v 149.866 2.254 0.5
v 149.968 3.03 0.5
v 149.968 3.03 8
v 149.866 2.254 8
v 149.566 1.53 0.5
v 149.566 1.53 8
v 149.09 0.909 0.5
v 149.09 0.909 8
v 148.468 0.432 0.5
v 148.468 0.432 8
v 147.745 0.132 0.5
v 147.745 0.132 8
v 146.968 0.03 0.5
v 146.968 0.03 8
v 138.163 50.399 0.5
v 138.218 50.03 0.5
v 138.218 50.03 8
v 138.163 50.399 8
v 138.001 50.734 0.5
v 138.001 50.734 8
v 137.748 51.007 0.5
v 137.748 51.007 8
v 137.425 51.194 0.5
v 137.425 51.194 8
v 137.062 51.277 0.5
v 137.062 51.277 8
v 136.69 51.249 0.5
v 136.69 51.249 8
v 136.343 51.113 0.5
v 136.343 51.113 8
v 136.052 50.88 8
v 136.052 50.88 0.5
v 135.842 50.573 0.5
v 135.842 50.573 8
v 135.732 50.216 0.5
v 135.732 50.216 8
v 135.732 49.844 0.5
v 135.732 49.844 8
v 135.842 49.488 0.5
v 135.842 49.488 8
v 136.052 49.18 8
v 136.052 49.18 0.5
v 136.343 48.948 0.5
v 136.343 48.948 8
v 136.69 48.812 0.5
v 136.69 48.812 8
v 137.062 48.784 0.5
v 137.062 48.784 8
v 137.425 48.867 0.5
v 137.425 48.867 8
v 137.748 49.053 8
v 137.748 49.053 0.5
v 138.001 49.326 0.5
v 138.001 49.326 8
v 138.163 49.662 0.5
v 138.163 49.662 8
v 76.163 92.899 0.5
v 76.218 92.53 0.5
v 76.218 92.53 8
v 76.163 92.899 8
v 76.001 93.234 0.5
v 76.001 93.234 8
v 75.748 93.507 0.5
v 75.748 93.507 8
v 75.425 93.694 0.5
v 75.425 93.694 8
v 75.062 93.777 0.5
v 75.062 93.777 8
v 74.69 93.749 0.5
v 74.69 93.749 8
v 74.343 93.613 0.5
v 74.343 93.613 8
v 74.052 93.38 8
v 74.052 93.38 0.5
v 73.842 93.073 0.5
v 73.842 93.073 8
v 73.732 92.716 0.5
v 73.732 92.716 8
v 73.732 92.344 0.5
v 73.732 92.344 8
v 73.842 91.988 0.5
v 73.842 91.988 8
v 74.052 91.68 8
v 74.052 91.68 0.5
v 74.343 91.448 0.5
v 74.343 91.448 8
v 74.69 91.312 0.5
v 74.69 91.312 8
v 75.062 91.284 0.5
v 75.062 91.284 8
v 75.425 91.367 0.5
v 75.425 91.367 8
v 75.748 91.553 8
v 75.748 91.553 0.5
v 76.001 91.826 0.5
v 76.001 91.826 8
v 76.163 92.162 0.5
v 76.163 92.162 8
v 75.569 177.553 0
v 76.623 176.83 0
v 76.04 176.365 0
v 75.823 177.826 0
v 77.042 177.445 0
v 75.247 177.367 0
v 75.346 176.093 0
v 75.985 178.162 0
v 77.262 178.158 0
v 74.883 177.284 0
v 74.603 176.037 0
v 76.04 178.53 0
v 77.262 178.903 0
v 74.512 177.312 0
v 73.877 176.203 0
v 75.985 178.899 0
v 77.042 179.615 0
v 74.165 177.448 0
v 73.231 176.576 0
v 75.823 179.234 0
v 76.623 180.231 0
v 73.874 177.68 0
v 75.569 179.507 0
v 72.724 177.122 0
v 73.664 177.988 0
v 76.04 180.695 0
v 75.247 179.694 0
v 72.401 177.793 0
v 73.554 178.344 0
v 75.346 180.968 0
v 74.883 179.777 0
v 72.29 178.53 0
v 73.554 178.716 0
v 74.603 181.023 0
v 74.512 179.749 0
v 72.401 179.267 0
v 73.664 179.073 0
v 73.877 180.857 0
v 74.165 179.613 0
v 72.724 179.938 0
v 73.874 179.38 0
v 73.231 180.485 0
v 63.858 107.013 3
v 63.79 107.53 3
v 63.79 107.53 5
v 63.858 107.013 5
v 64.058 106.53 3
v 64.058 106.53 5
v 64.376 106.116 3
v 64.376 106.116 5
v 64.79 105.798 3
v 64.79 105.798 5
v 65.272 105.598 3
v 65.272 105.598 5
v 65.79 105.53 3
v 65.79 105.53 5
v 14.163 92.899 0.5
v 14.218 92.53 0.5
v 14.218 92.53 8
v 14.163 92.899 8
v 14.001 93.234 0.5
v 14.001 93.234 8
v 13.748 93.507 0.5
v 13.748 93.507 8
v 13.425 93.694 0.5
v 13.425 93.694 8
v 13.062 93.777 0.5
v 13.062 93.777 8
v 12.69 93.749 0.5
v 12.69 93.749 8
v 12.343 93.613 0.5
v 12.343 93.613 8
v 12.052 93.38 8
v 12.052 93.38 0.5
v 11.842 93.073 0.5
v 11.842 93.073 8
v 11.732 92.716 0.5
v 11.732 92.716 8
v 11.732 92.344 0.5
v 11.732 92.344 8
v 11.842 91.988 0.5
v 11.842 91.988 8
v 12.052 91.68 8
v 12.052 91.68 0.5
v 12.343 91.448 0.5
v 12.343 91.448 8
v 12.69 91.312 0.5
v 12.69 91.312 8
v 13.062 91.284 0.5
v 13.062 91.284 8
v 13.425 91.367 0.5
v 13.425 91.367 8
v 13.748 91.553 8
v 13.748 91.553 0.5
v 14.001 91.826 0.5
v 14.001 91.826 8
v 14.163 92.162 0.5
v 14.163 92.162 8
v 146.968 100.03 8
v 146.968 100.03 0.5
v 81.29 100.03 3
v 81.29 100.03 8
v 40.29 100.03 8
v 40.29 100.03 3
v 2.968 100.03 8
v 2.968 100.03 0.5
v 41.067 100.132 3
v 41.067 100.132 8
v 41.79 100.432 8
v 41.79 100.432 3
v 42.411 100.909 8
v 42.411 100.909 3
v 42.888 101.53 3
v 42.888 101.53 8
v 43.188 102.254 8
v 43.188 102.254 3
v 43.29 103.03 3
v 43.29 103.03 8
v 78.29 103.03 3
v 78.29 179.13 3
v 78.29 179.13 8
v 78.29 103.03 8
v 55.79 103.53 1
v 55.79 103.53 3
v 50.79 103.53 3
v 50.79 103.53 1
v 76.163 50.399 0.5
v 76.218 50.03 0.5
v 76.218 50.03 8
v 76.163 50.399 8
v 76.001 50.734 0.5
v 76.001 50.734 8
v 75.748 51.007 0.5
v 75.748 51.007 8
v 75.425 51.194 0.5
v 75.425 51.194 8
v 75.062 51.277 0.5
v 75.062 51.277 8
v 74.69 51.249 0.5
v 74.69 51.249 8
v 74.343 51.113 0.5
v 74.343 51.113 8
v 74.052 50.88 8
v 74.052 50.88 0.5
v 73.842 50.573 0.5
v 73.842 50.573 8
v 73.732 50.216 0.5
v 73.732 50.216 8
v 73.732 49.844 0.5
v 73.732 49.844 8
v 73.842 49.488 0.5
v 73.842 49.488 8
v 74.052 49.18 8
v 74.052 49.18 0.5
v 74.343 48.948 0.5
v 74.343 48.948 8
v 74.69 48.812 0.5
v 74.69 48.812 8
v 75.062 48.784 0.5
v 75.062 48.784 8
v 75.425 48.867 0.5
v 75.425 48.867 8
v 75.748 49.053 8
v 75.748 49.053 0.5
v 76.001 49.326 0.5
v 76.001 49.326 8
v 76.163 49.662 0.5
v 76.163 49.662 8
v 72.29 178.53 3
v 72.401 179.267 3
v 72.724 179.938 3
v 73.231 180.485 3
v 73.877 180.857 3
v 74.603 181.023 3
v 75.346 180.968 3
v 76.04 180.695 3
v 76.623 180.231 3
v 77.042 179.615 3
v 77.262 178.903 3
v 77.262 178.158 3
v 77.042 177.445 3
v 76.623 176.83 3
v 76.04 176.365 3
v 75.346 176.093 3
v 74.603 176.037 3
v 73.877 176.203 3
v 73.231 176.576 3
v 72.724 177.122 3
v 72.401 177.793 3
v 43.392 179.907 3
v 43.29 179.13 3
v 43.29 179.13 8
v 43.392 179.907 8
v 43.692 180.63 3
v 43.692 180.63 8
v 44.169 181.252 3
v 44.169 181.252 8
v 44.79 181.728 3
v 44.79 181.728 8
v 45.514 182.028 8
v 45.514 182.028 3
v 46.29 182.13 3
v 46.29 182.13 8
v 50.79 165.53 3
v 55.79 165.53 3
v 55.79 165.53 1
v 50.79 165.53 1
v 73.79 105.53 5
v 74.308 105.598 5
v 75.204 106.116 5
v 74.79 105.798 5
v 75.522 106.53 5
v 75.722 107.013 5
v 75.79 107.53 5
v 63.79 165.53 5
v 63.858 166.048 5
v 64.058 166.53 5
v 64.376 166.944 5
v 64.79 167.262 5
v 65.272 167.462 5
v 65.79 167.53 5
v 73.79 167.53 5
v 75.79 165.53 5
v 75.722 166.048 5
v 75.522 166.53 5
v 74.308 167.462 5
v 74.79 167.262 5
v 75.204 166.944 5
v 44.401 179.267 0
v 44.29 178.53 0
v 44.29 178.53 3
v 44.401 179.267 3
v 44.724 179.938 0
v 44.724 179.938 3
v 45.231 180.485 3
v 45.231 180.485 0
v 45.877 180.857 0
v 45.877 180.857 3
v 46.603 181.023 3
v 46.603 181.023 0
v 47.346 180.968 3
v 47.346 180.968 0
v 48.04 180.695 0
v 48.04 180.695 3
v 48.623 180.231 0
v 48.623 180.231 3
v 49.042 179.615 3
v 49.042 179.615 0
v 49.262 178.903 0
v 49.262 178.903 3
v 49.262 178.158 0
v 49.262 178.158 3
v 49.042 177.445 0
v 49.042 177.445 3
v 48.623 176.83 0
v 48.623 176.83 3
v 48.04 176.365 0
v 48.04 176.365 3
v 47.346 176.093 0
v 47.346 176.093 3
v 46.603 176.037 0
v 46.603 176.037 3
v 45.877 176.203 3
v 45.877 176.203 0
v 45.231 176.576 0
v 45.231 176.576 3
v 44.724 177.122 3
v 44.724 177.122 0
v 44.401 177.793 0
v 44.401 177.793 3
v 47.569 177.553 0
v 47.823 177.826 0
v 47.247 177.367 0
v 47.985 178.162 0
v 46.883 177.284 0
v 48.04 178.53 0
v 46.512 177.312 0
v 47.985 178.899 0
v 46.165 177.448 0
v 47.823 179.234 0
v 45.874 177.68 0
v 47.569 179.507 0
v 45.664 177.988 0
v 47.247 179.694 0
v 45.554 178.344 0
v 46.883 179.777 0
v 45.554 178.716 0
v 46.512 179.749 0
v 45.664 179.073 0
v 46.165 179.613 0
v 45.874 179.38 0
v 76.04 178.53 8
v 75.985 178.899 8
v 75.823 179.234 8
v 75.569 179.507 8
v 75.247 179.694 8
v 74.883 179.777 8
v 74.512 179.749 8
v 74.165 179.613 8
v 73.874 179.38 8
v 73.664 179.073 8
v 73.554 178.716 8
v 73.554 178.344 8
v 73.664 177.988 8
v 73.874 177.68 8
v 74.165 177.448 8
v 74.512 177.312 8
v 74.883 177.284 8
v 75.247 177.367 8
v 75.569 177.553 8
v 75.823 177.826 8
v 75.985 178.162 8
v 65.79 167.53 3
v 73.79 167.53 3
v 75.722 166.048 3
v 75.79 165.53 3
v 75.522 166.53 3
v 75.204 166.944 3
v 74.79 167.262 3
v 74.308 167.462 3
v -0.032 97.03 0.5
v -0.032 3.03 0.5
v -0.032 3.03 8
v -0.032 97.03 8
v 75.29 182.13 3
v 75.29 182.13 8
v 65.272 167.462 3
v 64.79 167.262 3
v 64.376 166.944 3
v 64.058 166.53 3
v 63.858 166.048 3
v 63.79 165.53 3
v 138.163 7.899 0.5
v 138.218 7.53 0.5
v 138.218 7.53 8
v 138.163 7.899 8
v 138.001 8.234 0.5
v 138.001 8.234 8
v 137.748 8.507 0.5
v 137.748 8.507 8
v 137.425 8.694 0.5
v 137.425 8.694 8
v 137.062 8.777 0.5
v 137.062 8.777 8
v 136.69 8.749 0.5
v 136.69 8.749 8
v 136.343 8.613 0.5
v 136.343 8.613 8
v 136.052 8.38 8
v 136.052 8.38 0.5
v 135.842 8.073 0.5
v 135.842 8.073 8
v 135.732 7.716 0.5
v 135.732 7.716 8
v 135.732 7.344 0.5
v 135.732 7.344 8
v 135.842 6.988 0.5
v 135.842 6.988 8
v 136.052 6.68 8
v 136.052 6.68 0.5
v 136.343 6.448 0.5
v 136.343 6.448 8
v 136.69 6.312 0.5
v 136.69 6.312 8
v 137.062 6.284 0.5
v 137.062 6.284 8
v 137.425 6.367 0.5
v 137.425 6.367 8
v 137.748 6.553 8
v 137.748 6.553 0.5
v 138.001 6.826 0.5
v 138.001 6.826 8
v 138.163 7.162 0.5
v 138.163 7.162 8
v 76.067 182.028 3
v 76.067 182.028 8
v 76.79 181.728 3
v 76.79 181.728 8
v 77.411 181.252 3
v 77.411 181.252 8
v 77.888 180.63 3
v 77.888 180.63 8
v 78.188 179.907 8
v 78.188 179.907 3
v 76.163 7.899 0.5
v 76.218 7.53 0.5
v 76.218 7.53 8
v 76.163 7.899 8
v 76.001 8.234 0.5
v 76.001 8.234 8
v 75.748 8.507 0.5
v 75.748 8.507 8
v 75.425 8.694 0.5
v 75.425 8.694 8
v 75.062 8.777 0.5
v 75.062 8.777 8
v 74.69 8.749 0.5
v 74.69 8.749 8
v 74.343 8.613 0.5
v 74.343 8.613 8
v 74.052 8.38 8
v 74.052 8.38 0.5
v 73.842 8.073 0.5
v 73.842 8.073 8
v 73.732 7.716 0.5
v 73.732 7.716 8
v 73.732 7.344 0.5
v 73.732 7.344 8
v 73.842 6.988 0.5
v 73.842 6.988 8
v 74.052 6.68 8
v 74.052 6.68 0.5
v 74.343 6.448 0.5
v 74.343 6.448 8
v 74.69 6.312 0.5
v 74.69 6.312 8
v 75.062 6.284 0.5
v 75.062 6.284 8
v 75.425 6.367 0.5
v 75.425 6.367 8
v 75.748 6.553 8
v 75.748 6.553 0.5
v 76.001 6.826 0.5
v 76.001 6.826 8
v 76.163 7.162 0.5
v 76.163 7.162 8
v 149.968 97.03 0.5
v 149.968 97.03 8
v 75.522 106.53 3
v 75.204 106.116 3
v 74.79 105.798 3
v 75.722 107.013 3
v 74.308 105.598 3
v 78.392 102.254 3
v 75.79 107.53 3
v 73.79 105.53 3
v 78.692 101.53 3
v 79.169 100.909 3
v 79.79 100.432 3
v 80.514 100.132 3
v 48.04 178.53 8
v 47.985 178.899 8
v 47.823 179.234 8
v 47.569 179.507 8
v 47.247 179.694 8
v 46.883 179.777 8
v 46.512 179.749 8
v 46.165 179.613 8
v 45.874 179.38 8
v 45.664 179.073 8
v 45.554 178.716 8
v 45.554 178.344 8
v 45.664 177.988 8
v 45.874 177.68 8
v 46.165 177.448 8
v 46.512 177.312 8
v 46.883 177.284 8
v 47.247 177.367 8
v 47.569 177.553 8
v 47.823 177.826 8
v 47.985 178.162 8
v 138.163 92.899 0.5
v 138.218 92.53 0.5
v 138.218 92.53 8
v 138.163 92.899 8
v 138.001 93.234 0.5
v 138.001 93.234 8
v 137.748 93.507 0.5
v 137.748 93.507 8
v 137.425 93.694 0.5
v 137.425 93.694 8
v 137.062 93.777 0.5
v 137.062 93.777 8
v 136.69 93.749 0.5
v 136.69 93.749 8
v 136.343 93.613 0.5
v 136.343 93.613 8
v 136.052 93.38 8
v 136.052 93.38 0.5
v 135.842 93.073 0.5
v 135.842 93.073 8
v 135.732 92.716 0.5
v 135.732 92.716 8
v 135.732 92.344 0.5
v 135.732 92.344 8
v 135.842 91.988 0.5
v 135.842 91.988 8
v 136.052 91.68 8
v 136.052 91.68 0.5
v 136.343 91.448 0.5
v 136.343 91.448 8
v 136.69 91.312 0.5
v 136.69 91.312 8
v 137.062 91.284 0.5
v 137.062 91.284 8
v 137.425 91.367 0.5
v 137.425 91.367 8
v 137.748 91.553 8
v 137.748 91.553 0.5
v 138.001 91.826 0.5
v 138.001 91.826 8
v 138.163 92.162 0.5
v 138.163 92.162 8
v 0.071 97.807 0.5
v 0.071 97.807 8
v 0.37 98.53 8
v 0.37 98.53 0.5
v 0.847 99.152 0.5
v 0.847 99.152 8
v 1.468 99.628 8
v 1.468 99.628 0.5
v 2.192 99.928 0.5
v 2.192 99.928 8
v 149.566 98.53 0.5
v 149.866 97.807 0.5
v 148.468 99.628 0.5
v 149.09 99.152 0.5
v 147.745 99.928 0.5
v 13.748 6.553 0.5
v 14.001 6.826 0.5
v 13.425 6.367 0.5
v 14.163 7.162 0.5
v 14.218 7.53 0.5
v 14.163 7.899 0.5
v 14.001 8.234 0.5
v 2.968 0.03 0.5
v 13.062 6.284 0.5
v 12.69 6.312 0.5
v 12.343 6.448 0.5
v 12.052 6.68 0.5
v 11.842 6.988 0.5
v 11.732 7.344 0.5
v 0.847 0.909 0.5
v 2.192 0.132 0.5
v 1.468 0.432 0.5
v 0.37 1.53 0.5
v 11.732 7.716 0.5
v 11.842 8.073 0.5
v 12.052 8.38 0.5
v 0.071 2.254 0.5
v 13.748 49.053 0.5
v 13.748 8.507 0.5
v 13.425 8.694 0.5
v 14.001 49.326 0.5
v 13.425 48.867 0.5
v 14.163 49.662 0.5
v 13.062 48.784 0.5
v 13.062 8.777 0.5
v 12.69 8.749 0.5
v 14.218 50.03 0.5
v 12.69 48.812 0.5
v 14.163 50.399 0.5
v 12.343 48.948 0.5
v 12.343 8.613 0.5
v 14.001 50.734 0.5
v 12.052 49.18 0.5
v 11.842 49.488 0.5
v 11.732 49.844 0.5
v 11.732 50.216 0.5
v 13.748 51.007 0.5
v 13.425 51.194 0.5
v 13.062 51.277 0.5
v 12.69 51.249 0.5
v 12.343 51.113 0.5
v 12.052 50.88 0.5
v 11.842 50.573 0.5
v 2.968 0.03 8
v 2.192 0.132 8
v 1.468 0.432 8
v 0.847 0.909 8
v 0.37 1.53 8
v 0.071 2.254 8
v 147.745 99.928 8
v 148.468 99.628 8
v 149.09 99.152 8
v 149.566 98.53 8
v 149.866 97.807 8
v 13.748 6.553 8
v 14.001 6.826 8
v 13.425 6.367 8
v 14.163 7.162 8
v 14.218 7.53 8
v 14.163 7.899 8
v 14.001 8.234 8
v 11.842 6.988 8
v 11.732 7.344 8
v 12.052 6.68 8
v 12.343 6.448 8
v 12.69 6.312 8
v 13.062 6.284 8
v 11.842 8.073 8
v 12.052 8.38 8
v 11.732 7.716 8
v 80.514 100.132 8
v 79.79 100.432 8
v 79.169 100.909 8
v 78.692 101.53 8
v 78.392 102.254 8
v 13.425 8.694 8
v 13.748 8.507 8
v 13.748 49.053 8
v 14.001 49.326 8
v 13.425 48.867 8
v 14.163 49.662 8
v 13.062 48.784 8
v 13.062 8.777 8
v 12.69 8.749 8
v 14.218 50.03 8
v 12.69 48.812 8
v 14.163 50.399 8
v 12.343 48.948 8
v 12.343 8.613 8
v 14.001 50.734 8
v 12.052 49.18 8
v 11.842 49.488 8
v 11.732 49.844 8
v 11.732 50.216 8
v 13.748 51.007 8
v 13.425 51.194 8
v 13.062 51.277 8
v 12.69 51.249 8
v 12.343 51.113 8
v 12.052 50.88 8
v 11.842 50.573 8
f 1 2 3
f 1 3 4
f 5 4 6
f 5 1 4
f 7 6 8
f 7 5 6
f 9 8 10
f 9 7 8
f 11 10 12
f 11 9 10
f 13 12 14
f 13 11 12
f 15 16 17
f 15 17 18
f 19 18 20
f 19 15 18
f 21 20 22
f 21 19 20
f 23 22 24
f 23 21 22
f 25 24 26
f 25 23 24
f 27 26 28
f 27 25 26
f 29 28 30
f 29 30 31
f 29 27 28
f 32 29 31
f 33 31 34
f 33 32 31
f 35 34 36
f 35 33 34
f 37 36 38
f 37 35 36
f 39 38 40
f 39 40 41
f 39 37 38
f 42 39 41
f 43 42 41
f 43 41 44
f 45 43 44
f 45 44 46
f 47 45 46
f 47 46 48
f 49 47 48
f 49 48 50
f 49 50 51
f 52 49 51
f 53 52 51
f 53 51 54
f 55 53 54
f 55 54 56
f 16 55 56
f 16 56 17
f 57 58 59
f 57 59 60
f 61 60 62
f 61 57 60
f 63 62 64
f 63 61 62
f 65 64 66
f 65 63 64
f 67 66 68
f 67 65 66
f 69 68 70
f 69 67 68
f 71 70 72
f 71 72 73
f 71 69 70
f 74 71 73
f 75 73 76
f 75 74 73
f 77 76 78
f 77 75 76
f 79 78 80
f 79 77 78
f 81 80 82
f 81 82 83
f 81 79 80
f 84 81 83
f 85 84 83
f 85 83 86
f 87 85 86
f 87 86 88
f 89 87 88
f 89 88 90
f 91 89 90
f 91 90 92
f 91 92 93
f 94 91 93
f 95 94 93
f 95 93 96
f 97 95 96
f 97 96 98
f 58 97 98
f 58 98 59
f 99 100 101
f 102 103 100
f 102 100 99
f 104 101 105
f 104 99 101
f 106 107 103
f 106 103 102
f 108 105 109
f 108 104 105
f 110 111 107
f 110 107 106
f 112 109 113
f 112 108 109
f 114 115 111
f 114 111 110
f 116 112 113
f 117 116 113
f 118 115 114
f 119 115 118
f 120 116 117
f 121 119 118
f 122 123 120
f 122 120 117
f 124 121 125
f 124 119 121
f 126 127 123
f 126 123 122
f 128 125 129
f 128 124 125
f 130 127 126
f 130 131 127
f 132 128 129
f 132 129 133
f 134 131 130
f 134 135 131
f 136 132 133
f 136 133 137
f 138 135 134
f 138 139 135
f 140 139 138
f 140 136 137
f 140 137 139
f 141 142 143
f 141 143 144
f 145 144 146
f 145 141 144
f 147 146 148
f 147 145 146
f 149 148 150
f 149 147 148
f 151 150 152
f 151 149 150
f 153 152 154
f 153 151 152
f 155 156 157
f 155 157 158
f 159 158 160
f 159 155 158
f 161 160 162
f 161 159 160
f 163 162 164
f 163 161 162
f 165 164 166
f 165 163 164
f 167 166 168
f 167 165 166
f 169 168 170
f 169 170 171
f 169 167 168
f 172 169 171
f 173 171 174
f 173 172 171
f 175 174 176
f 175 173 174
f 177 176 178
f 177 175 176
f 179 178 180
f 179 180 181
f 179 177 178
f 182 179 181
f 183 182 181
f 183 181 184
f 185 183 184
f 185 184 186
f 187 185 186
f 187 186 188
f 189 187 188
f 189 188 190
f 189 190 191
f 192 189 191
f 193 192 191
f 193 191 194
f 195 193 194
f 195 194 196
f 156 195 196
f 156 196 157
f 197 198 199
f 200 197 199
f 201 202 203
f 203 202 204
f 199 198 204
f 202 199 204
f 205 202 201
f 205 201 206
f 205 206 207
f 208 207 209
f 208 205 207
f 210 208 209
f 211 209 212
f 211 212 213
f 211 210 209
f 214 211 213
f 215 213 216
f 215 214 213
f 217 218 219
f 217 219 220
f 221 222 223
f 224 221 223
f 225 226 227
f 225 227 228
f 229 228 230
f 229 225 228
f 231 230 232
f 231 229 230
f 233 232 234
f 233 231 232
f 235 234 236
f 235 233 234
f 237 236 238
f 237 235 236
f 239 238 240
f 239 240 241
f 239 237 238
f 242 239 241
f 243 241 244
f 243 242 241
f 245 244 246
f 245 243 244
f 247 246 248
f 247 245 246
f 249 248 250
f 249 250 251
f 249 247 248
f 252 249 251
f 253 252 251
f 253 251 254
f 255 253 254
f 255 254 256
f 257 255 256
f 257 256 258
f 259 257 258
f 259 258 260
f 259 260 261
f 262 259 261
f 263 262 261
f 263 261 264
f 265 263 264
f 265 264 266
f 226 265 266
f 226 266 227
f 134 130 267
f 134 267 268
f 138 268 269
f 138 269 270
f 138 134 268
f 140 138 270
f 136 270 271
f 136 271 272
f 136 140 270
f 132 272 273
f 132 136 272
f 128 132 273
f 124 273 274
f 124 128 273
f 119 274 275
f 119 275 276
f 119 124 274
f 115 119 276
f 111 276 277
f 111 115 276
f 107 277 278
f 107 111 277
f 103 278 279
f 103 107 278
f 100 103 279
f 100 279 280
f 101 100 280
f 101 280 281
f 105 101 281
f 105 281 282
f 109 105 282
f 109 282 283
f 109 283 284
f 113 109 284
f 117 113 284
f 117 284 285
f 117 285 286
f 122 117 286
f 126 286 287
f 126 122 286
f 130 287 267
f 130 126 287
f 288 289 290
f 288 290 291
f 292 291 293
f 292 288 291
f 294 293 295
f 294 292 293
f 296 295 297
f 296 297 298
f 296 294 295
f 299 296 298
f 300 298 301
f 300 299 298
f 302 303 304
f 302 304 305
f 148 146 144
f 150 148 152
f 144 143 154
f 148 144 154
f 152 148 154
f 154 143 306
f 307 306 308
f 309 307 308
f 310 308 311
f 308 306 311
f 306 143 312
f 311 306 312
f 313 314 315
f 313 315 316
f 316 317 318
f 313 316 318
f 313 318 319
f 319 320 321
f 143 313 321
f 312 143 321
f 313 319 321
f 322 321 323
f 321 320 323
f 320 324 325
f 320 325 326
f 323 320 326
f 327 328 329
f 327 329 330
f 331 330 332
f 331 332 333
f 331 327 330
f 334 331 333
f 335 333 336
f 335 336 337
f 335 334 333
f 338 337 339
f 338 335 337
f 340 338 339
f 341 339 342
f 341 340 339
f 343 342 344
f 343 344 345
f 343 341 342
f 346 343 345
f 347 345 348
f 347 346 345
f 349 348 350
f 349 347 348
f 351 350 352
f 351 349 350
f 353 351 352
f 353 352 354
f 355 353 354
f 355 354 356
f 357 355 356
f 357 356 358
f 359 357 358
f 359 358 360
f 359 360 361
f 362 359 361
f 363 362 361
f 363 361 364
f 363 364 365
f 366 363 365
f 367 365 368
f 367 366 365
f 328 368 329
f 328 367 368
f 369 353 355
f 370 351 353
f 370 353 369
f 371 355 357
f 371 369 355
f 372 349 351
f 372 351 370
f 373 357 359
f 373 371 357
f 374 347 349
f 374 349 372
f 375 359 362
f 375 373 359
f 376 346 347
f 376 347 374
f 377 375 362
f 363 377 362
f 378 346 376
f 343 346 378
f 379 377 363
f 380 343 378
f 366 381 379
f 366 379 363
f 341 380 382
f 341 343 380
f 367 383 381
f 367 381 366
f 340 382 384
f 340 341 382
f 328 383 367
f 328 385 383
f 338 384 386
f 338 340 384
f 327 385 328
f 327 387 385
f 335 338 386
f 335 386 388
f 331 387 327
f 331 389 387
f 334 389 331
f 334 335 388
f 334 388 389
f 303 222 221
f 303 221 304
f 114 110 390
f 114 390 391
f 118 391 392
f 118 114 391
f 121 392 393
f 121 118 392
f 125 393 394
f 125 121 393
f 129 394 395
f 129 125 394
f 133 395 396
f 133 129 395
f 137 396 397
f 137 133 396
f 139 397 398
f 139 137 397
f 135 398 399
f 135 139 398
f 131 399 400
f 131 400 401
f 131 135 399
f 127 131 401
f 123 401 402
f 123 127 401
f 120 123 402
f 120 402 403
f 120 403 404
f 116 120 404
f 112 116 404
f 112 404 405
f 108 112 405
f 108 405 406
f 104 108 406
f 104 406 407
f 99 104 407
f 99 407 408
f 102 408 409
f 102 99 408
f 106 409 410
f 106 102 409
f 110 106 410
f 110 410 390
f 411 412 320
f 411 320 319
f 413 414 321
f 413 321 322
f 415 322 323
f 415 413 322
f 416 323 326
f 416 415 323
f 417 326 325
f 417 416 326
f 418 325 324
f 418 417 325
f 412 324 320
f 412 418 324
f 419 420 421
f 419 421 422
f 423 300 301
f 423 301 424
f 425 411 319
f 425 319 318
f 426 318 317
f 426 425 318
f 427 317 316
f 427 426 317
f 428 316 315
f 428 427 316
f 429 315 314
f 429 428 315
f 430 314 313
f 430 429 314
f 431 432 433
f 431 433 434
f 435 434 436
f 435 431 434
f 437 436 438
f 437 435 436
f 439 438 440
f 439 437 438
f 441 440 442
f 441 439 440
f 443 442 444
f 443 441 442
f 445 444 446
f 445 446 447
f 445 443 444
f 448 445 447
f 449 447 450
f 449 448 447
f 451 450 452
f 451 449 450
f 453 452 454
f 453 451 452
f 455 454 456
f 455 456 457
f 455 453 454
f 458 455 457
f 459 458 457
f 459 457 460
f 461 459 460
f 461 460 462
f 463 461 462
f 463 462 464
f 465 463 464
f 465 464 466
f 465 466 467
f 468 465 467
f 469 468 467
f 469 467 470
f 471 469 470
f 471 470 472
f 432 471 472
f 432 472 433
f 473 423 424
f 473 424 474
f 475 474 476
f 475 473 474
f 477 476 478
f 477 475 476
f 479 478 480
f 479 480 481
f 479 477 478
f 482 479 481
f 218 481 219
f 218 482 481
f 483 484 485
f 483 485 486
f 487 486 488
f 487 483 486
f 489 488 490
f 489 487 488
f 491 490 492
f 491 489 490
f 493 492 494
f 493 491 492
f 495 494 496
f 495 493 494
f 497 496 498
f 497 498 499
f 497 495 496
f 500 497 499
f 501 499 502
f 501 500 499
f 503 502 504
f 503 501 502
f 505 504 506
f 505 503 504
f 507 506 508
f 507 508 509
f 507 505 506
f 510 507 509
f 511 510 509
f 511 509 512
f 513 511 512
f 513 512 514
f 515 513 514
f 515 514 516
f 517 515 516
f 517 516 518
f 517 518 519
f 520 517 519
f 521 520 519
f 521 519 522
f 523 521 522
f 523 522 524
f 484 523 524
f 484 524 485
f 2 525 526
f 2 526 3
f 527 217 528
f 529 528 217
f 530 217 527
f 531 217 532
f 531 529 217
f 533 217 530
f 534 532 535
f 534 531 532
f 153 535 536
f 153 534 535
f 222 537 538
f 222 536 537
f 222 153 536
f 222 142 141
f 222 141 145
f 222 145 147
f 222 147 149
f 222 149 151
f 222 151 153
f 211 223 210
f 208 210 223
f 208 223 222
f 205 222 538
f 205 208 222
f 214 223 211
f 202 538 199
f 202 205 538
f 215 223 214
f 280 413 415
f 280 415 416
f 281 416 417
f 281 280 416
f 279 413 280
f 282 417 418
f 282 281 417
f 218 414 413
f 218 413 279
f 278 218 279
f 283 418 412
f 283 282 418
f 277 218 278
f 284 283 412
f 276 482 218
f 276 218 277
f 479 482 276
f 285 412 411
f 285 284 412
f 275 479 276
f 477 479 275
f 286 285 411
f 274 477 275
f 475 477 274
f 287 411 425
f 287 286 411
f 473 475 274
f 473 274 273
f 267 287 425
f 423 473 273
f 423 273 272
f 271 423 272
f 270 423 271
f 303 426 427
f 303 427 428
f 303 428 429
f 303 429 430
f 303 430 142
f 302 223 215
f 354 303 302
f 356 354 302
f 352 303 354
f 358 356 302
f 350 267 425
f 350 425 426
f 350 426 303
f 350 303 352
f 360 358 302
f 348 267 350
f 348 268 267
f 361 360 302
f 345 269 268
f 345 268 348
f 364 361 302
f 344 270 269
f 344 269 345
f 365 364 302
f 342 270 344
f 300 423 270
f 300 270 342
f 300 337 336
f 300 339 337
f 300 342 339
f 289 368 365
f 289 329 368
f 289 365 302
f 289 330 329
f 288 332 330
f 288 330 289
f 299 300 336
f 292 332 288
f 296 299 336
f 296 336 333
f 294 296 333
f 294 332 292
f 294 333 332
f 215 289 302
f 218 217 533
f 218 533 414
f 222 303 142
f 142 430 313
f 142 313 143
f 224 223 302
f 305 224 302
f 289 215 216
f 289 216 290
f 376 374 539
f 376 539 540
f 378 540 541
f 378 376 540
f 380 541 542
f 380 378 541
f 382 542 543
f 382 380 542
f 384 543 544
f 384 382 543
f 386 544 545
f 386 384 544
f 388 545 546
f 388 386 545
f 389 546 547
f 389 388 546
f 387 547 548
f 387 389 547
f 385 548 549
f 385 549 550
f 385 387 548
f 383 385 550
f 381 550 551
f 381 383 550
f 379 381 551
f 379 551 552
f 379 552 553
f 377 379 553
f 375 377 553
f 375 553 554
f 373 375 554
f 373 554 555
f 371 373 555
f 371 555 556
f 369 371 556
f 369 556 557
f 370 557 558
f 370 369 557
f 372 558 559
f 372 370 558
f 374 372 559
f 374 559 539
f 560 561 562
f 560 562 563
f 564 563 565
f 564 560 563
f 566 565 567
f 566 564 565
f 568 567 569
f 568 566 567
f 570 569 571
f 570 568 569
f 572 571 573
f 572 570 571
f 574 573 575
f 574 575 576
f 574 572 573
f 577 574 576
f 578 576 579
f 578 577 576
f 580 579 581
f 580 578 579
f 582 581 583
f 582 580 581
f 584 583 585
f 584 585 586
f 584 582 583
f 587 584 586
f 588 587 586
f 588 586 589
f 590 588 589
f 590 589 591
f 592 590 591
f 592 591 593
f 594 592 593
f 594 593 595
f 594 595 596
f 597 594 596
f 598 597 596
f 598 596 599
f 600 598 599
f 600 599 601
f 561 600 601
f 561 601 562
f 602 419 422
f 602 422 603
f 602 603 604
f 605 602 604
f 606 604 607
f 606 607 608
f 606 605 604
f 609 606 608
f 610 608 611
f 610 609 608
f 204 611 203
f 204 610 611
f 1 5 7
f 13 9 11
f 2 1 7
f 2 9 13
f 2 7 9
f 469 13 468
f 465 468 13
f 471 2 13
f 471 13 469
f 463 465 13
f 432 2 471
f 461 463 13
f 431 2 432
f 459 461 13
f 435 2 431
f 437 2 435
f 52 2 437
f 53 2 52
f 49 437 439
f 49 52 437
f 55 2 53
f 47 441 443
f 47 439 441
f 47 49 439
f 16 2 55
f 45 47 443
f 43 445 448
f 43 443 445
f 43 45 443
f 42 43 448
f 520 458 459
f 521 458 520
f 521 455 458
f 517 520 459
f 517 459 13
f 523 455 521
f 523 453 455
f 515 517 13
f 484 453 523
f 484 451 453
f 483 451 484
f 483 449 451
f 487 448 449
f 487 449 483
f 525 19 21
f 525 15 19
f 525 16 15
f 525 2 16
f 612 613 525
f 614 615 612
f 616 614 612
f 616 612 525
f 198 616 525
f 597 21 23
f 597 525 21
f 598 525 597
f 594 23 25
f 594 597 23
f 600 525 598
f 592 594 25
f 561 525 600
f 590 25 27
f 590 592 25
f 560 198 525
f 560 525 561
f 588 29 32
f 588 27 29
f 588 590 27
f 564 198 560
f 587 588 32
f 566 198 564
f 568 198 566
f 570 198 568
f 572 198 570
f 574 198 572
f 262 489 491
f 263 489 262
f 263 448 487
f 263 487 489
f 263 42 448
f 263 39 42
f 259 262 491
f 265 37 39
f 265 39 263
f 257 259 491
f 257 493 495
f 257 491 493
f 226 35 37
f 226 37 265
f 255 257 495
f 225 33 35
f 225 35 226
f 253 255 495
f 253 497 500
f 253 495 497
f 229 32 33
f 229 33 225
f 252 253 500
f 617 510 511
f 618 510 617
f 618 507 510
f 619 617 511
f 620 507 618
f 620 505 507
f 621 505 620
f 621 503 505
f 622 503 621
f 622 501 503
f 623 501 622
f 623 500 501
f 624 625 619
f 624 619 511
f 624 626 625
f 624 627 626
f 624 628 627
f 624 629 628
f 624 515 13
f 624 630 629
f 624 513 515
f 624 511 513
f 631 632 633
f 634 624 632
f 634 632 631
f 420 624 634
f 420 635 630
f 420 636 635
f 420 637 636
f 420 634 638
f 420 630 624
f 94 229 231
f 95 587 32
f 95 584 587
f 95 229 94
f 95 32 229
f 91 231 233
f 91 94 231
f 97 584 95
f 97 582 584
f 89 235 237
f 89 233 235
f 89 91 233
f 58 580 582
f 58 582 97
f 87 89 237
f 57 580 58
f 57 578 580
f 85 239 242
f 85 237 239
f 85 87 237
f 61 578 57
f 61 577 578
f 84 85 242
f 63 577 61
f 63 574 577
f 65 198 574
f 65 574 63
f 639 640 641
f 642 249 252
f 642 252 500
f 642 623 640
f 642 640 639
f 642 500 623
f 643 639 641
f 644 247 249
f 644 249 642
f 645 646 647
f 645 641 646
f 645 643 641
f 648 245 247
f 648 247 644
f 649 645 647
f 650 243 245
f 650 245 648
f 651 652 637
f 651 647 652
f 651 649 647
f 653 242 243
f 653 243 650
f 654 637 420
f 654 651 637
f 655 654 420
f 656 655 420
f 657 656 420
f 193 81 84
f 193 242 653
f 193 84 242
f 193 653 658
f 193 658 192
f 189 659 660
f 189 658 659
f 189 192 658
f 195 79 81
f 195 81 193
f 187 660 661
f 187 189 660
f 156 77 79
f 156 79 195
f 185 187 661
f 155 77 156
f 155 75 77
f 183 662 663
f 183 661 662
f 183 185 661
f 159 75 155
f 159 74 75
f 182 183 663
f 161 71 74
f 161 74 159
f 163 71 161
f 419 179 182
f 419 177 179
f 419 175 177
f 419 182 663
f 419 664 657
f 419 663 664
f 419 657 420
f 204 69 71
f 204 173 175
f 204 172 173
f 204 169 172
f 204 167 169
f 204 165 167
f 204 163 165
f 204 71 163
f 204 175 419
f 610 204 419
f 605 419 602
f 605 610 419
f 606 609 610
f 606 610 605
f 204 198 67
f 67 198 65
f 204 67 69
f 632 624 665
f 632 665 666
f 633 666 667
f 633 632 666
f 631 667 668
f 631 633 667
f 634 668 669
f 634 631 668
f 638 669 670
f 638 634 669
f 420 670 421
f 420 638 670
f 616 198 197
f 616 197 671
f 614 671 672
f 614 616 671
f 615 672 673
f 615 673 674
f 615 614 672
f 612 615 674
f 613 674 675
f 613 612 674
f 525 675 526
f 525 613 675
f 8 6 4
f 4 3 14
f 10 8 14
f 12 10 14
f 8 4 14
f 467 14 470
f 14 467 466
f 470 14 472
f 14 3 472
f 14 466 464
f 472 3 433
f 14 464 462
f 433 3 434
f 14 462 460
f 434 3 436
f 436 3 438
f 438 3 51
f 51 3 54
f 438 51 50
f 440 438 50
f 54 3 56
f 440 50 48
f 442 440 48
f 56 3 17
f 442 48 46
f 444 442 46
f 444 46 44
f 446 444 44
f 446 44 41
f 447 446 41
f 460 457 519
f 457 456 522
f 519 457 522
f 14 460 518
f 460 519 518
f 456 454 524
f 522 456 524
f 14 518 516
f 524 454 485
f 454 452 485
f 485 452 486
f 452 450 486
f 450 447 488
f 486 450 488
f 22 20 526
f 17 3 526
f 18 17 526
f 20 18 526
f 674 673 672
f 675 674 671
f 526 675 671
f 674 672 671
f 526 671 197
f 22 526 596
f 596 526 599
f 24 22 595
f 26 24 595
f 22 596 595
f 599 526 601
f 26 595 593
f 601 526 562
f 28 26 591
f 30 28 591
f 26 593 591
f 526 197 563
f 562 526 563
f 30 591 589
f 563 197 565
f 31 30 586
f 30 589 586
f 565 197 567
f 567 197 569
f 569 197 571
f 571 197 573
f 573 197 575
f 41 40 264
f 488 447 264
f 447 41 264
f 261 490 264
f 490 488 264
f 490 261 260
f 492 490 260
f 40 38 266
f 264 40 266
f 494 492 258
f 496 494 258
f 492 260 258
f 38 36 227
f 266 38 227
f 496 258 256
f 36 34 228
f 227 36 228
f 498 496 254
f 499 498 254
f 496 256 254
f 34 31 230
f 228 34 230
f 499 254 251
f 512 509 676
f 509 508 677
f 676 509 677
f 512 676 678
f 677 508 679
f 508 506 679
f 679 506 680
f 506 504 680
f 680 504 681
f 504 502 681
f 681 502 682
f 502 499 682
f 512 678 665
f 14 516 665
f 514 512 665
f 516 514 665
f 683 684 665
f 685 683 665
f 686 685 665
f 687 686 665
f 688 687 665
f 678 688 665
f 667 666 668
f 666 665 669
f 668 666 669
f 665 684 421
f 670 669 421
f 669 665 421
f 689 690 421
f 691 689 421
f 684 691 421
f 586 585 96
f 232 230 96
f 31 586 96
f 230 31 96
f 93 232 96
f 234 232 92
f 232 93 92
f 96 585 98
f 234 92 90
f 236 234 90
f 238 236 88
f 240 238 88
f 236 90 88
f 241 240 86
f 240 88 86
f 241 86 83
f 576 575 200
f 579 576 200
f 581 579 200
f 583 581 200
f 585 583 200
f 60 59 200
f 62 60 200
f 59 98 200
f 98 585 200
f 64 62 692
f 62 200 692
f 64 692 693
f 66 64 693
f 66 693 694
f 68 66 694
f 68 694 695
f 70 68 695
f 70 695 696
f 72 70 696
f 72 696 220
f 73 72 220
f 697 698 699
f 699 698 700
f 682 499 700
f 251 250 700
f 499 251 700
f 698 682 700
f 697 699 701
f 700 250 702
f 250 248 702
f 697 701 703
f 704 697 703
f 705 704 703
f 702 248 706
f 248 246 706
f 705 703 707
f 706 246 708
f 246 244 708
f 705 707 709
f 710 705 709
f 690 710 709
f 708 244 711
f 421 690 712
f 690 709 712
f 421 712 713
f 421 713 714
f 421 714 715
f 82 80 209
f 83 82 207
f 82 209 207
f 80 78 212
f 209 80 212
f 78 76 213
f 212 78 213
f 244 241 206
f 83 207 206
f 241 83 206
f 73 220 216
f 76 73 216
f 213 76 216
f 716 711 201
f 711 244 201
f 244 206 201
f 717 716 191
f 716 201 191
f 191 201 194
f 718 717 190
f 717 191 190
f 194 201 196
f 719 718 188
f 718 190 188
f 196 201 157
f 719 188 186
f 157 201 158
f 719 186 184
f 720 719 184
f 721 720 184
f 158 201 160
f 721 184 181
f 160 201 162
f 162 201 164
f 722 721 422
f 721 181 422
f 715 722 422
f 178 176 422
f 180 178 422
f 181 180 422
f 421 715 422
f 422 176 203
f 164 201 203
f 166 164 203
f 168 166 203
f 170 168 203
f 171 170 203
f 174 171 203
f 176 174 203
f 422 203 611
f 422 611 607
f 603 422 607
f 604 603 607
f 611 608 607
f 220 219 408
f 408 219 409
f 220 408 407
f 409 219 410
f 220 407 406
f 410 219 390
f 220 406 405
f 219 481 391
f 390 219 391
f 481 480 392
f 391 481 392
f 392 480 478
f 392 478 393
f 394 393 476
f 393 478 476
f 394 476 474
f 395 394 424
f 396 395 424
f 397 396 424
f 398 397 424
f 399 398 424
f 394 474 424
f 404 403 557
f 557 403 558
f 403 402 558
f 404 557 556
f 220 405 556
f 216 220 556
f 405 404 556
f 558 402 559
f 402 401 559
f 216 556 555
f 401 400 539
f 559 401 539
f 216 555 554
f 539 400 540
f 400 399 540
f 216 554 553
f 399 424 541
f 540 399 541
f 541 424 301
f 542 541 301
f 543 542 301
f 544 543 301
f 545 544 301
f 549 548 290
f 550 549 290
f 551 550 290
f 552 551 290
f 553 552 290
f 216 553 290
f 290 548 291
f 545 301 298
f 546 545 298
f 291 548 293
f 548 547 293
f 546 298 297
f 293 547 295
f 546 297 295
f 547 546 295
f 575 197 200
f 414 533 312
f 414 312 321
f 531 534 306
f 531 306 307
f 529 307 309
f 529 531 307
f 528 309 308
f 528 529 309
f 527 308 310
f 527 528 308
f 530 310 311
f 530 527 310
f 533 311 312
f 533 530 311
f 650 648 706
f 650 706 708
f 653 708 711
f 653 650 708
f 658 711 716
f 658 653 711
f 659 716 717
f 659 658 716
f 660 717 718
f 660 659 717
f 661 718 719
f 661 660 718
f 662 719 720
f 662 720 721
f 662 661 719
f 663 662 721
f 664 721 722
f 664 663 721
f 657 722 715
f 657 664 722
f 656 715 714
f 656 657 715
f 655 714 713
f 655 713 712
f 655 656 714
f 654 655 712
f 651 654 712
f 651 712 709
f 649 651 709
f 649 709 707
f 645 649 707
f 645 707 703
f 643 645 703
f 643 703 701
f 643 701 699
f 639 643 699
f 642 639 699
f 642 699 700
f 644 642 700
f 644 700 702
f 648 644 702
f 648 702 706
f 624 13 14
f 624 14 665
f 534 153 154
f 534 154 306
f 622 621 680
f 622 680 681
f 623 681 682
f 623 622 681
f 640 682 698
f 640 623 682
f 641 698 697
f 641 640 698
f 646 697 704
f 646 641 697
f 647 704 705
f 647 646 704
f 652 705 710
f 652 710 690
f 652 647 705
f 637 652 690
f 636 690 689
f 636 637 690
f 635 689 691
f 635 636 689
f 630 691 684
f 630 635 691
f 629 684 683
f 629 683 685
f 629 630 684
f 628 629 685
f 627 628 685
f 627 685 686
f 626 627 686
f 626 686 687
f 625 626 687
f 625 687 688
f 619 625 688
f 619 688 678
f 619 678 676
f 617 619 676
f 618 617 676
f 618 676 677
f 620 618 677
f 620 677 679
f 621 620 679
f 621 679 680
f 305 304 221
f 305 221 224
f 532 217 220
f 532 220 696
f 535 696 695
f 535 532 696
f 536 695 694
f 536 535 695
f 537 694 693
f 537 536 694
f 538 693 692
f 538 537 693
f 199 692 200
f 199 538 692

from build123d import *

# Parameters (mm, degrees)
ESQUISSE1_R             = 1.25
BOSS_EXTRU_1_DEPTH      = 8
ESQUISSE5_W             = 45.3176151
ESQUISSE5_H             = 84.101601091
ESQUISSE5_R             = 2.5
ENL_V_MAT_EXTRU_2_DEPTH = 3
ESQUISSE6_W             = 5
ESQUISSE6_H             = 62
BOSS_DC_DC_DEPTH        = 2
ENL_V_INDUCTORS_DEPTH   = 2
ESQUISSE8_W             = 154.760825025
ESQUISSE8_H             = 103.254487946
ENL_V_MAT_EXTRU_3_DEPTH = 0.5


with BuildPart() as part:
    # Esquisse1 → Boss.-Extru.1 (new body)
    with BuildSketch(Plane.XY):
        with BuildLine():
            Line((43.290045774, 103.030192742), (43.290045774, 179.130192742))
            ThreePointArc((43.290045774, 179.130192742), (44.16872543, 181.251513085), (46.290045774, 182.130192742))
            Line((46.290045774, 182.130192742), (75.290045774, 182.130192742))
            ThreePointArc((75.290045774, 182.130192742), (77.411366118, 181.251513085), (78.290045774, 179.130192742))
            Line((78.290045774, 179.130192742), (78.290045774, 103.030192742))
            ThreePointArc((78.290045774, 103.030192742), (79.16872543, 100.908872398), (81.290045774, 100.030192742))
            Line((81.290045774, 100.030192742), (146.96841177, 100.030192742))
            ThreePointArc((146.96841177, 100.030192742), (149.089732114, 99.151513085), (149.96841177, 97.030192742))
            Line((149.96841177, 97.030192742), (149.96841177, 3.030192742))
            ThreePointArc((149.96841177, 3.030192742), (149.089732114, 0.908872398), (146.96841177, 0.030192742))
            Line((146.96841177, 0.030192742), (2.96841177, 0.030192742))
            ThreePointArc((2.96841177, 0.030192742), (0.847091427, 0.908872398), (-0.03158823, 3.030192742))
            Line((-0.03158823, 3.030192742), (-0.03158823, 97.030192742))
            ThreePointArc((-0.03158823, 97.030192742), (0.847091427, 99.151513085), (2.96841177, 100.030192742))
            Line((2.96841177, 100.030192742), (40.290045774, 100.030192742))
            ThreePointArc((40.290045774, 100.030192742), (42.411366118, 100.908872398), (43.290045774, 103.030192742))
        make_face()
        with Locations((12.96841177, 92.530192742)):
            Circle(ESQUISSE1_R, mode=Mode.SUBTRACT)
        with Locations((74.96841177, 92.530192742)):
            Circle(ESQUISSE1_R, mode=Mode.SUBTRACT)
        with Locations((136.96841177, 92.530192742)):
            Circle(ESQUISSE1_R, mode=Mode.SUBTRACT)
        with Locations((12.96841177, 50.030192742)):
            Circle(ESQUISSE1_R, mode=Mode.SUBTRACT)
        with Locations((74.96841177, 50.030192742)):
            Circle(ESQUISSE1_R, mode=Mode.SUBTRACT)
        with Locations((136.96841177, 50.030192742)):
            Circle(ESQUISSE1_R, mode=Mode.SUBTRACT)
        with Locations((136.96841177, 7.530192742)):
            Circle(ESQUISSE1_R, mode=Mode.SUBTRACT)
        with Locations((74.96841177, 7.530192742)):
            Circle(ESQUISSE1_R, mode=Mode.SUBTRACT)
        with Locations((12.96841177, 7.530192742)):
            Circle(ESQUISSE1_R, mode=Mode.SUBTRACT)
        with Locations((46.790045774, 178.530192742)):
            Circle(ESQUISSE1_R, mode=Mode.SUBTRACT)
        with Locations((74.790045774, 178.530192742)):
            Circle(ESQUISSE1_R, mode=Mode.SUBTRACT)
    extrude(amount=BOSS_EXTRU_1_DEPTH)

    # Esquisse5 → Enlèv. mat.-Extru.2 (cut)
    with BuildSketch(Plane(origin=(0, 0, 0), x_dir=(-1, 0, 0), z_dir=(0, 0, -1))):
        with Locations((-61.04710063, 142.080993288)):
            Rectangle(ESQUISSE5_W, ESQUISSE5_H)
        with Locations((-74.790045774, 178.530192742)):
            Circle(ESQUISSE5_R, mode=Mode.SUBTRACT)
        with Locations((-46.790045774, 178.530192742)):
            Circle(ESQUISSE5_R, mode=Mode.SUBTRACT)
    extrude(amount=-ENL_V_MAT_EXTRU_2_DEPTH, mode=Mode.SUBTRACT)

    # Esquisse6 → Boss.-DC/DC (add)
    with BuildSketch(Plane(origin=(0, 0, 3), x_dir=(-1, 0, 0), z_dir=(0, 0, -1))):
        with Locations((-53.290045774, 134.530192742)):
            Rectangle(ESQUISSE6_W, ESQUISSE6_H)
    extrude(amount=BOSS_DC_DC_DEPTH)

    # Esquisse7 → Enlèv. Inductors (cut)
    with BuildSketch(Plane(origin=(0, 0, 3), x_dir=(-1, 0, 0), z_dir=(0, 0, -1))):
        with BuildLine():
            Line((-73.790045774, 167.530192742), (-65.790045774, 167.530192742))
            ThreePointArc((-65.790045774, 167.530192742), (-64.375832212, 166.944406304), (-63.790045774, 165.530192742))
            Line((-63.790045774, 165.530192742), (-63.790045774, 107.530192742))
            ThreePointArc((-63.790045774, 107.530192742), (-64.375832212, 106.115979179), (-65.790045774, 105.530192742))
            Line((-65.790045774, 105.530192742), (-73.790045774, 105.530192742))
            ThreePointArc((-73.790045774, 105.530192742), (-75.204259336, 106.115979179), (-75.790045774, 107.530192742))
            Line((-75.790045774, 107.530192742), (-75.790045774, 165.530192742))
            ThreePointArc((-75.790045774, 165.530192742), (-75.204259336, 166.944406304), (-73.790045774, 167.530192742))
        make_face()
    extrude(amount=-ENL_V_INDUCTORS_DEPTH, mode=Mode.SUBTRACT)

    # Esquisse8 → Enlèv. mat.-Extru.3 (cut)
    with BuildSketch(Plane(origin=(0, 0, 0), x_dir=(-1, 0, 0), z_dir=(0, 0, -1))):
        with Locations((-74.96841177, 50.092755489)):
            Rectangle(ESQUISSE8_W, ESQUISSE8_H)
    extrude(amount=-ENL_V_MAT_EXTRU_3_DEPTH, mode=Mode.SUBTRACT)


solid = part.part
